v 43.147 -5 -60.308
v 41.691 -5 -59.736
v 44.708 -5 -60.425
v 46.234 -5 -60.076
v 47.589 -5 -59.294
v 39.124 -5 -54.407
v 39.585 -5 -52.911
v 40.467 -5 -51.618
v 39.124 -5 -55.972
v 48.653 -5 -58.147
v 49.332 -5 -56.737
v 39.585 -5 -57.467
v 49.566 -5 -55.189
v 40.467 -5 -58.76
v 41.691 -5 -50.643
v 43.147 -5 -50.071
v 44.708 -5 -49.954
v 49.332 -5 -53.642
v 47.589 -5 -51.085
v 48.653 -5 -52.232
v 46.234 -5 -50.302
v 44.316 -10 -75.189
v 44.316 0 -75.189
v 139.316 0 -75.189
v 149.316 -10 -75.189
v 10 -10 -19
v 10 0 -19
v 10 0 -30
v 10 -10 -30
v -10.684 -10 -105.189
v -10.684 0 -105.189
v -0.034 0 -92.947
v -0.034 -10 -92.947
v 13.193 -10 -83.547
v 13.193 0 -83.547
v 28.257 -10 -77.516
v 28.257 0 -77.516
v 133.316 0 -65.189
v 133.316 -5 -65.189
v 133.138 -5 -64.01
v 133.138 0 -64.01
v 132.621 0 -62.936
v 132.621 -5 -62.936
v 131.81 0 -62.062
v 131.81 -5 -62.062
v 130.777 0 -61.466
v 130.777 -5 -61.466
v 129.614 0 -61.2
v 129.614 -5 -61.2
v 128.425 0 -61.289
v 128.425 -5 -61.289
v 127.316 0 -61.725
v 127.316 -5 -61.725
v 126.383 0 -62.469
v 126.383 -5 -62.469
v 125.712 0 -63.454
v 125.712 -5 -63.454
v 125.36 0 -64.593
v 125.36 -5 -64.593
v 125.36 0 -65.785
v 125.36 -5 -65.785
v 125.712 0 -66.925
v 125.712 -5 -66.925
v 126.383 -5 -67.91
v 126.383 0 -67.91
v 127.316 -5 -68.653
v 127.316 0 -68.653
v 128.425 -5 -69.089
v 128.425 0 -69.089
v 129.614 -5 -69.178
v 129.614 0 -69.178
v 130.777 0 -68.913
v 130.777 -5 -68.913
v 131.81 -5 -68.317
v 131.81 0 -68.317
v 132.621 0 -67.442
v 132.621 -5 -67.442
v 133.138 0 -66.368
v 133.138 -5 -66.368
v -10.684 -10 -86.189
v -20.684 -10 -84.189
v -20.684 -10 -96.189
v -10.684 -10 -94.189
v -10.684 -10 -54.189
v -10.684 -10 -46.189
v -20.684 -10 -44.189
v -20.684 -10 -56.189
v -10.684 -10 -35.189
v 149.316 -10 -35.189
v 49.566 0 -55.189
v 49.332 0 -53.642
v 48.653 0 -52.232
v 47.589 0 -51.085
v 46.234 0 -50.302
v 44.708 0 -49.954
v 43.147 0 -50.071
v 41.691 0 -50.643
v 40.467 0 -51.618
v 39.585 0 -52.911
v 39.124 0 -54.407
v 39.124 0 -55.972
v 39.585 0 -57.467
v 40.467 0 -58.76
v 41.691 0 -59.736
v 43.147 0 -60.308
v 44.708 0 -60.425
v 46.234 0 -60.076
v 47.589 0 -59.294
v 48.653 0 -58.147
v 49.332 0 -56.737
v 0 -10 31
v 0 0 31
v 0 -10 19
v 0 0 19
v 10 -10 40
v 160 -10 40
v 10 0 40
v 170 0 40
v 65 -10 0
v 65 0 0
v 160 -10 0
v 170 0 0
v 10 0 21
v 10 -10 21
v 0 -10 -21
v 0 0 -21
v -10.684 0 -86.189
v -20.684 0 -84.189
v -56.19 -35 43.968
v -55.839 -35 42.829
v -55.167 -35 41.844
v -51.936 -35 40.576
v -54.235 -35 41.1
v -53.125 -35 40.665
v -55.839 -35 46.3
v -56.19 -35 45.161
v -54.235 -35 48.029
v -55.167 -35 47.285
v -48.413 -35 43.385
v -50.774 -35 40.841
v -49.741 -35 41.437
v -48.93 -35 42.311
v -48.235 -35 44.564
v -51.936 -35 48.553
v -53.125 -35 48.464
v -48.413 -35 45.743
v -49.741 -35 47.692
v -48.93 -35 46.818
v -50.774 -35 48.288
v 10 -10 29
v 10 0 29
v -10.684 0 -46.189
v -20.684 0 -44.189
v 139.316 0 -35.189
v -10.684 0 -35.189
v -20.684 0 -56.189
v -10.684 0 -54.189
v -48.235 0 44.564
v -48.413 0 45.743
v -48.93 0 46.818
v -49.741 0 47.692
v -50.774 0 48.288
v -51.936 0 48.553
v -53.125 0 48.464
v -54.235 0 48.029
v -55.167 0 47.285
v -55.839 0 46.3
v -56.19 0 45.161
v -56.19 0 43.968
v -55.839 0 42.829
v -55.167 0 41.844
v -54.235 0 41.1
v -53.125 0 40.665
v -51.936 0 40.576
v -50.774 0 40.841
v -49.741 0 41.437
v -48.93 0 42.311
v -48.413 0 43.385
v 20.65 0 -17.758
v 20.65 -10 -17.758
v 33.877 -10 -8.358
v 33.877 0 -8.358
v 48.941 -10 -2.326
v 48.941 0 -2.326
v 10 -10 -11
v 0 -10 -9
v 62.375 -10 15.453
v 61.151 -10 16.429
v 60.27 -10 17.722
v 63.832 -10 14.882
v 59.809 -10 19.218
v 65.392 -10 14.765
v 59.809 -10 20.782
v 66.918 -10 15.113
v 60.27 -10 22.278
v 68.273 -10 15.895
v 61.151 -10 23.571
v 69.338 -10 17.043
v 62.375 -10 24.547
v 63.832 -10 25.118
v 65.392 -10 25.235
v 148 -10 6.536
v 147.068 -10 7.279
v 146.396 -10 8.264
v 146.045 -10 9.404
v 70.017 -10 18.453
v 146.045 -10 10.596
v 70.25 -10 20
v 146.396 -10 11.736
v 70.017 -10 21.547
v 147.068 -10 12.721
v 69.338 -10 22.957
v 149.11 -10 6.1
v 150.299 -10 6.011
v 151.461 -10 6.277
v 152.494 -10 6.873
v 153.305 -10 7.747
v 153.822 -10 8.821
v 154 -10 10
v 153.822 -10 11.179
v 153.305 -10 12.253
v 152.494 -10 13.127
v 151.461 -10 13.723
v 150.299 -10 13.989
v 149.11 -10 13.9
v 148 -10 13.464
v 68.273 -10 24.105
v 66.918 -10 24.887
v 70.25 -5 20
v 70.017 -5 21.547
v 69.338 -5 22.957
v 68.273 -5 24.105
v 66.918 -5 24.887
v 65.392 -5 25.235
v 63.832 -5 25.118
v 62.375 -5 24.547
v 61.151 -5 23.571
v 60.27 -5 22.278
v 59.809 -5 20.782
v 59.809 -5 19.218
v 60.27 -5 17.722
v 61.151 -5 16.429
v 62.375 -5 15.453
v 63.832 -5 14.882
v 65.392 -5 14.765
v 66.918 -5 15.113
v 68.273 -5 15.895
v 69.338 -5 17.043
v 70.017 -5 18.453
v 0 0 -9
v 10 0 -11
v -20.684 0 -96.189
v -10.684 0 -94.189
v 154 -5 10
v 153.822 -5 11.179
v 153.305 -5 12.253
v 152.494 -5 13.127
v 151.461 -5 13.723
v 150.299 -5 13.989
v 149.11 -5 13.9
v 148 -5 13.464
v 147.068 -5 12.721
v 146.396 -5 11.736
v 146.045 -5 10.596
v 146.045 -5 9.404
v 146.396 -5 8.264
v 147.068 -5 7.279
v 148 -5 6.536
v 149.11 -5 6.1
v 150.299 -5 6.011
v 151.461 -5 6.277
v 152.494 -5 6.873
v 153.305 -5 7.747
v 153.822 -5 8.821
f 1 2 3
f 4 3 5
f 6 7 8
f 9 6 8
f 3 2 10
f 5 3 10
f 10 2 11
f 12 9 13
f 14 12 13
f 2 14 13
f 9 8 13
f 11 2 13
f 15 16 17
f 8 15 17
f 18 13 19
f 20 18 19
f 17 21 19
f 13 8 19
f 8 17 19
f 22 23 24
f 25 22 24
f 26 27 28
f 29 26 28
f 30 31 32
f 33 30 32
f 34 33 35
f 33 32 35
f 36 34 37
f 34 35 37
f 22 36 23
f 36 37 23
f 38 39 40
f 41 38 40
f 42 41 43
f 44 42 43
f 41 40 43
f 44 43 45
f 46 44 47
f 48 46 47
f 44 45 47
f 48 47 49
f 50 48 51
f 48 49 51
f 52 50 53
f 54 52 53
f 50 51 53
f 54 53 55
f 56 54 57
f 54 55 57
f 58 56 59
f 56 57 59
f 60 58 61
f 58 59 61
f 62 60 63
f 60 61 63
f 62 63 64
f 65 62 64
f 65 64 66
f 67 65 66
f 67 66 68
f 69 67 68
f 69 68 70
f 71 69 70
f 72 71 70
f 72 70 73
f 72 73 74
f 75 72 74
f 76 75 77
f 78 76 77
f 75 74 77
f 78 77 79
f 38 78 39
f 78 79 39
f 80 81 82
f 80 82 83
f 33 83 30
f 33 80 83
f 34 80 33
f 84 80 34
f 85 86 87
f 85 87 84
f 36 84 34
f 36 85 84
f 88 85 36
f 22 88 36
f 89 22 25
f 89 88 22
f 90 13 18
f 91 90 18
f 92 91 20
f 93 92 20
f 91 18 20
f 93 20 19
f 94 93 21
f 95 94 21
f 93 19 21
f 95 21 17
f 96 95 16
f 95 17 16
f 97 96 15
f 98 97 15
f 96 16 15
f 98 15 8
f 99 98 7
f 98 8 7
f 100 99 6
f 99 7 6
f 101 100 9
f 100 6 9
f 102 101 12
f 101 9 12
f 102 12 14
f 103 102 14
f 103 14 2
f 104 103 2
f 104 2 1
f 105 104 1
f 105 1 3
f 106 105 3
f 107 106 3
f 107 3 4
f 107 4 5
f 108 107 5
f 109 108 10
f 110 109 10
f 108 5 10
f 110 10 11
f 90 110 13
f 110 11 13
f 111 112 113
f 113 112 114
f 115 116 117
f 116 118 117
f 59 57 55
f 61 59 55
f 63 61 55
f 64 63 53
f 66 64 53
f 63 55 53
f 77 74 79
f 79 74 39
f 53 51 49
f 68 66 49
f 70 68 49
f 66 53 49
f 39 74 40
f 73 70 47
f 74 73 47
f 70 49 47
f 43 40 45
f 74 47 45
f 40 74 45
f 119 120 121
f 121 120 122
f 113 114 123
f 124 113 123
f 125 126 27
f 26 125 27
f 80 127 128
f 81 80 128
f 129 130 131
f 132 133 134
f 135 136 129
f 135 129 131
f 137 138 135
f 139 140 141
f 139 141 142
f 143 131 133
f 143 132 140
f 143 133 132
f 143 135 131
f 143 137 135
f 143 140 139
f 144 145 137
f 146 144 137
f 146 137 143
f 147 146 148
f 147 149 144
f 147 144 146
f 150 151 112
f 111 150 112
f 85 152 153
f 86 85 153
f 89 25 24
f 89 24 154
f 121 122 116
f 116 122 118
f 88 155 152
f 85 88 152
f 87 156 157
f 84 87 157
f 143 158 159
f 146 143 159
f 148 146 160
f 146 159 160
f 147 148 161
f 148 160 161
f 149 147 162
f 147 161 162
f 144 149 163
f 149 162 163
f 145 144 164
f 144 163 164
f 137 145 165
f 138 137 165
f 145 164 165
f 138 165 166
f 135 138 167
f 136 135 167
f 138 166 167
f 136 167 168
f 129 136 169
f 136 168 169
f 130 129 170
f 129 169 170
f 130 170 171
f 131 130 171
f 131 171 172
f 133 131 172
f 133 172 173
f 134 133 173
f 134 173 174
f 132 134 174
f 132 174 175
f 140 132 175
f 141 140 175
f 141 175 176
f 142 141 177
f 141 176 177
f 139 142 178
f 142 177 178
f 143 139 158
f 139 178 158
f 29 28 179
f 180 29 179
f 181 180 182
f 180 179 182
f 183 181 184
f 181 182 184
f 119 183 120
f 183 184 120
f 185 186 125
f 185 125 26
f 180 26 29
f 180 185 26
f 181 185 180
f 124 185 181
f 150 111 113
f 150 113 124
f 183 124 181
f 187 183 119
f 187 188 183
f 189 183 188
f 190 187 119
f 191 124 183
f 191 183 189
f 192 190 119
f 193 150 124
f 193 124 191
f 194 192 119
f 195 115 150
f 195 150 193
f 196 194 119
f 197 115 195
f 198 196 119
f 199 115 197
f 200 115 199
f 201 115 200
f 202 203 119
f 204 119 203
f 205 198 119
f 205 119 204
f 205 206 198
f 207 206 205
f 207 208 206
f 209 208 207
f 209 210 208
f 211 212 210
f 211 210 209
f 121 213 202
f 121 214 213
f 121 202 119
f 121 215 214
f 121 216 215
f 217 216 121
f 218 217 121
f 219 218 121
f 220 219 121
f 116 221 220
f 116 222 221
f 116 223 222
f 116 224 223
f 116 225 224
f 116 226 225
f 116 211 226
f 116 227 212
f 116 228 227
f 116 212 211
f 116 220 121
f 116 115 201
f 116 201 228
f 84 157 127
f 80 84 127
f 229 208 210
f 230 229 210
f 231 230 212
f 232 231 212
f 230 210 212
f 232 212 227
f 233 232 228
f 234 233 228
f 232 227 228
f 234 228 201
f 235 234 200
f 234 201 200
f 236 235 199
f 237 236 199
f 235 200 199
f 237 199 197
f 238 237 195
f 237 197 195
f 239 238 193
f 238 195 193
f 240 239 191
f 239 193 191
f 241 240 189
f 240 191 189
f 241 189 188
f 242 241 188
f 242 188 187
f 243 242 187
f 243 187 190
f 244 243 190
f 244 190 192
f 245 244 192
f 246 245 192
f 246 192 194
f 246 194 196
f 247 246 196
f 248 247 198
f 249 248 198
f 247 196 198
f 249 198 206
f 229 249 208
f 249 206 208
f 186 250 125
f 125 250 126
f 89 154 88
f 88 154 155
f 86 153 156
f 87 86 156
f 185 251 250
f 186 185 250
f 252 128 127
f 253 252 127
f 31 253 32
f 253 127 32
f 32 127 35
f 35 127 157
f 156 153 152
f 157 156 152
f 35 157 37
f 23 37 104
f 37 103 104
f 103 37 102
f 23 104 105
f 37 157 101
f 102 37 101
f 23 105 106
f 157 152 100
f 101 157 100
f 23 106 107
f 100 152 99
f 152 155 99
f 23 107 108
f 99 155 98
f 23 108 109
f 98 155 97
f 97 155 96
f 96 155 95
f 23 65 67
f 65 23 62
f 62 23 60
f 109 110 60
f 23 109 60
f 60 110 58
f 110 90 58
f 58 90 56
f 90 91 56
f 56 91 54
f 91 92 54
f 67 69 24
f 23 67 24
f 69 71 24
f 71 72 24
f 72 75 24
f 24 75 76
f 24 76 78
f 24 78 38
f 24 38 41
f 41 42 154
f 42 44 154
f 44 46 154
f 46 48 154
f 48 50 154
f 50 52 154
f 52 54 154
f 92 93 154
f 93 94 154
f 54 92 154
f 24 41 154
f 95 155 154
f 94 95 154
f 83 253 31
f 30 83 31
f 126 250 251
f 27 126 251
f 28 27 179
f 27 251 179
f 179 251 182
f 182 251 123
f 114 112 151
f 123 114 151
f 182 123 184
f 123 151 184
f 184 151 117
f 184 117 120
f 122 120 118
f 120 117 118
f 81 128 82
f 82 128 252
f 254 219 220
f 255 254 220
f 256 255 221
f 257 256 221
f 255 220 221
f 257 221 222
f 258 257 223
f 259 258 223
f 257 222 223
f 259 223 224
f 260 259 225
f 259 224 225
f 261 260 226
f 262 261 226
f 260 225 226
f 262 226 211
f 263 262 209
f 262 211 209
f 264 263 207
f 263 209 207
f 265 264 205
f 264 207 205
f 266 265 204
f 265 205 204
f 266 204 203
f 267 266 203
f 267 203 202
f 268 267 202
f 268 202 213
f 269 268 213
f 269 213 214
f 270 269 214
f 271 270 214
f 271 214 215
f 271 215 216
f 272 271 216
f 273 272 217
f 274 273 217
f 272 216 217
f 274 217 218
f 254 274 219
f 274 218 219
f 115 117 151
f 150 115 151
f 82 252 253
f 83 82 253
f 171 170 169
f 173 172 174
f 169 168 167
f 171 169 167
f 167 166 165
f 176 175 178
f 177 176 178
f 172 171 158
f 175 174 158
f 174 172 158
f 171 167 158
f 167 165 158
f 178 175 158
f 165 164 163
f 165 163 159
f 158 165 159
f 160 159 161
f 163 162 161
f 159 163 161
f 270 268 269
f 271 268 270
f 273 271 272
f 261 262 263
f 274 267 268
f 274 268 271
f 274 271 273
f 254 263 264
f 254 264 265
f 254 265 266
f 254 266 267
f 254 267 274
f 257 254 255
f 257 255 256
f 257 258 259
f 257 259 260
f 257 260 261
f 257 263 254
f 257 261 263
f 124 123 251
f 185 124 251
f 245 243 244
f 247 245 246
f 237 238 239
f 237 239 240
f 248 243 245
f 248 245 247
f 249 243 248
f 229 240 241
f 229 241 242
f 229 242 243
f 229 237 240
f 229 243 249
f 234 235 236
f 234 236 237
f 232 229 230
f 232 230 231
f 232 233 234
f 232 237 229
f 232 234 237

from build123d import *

# Parameters (mm, degrees)
F1_DEPTH  = 10
F2_R      = 5.25
F2_R_2    = 4
F3_DEPTH  = 5
F4_SIZE   = 9.99999
F6_DEPTH  = 10
F8_START  = -5
F7_R      = 5.25
F7_R_2    = 4
F8_DEPTH  = 5
F9_SIZE   = 9.99999
F10_R     = 4
F11_DEPTH = 35


# Not quite as in the source:
# - a fillet or chamfer is up to 0.001 mm smaller than in the source, because OpenCascade refuses the exact size


with BuildPart() as f1:
    # F0 (on Front) → F1 (new body)
    with BuildSketch(Plane.XZ):
        with BuildLine():
            ThreePointArc((10, -30), (33.8771457744, -8.3581005863), (65, 0))
            Line((65, 0), (170, 0))
            Line((170, 0), (170, 40))
            Line((170, 40), (10, 40))
            Line((10, 40), (10, 29))
            Line((10, 29), (0, 31))
            Line((0, 31), (0, 19))
            Line((0, 19), (10, 21))
            Line((10, 21), (10, -11))
            Line((10, -11), (0, -9))
            Line((0, -9), (0, -21))
            Line((0, -21), (10, -19))
            Line((10, -19), (10, -30))
        make_face()
    extrude(amount=F1_DEPTH)

    # F2 (on face) → F3 (cut)
    with BuildSketch(Plane.XZ.offset(10)):
        with Locations((65, 20)):
            Circle(F2_R)
        with Locations((150, 10)):
            Circle(F2_R_2)
    extrude(amount=-F3_DEPTH, mode=Mode.SUBTRACT)

    # F4 (size 10 in the source; OpenCascade refuses exactly that, so slightly less here)
    f4_edges = [f1.edges().sort_by_distance(p)[0] for p in [
        (170, -10, 20),
    ]]
    chamfer(f4_edges, length=F4_SIZE)


with BuildPart() as f6:
    # F5 (on Front) → F6 (new body)
    with BuildSketch(Plane.XZ):
        with BuildLine():
            ThreePointArc((-10.6844227825, -105.189197356), (13.1927229919, -83.5472979423), (44.3155772175, -75.189197356))
            Line((44.3155772175, -75.189197356), (149.3155772175, -75.189197356))
            Line((149.3155772175, -75.189197356), (149.3155772175, -35.189197356))
            Line((149.3155772175, -35.189197356), (-10.6844227825, -35.189197356))
            Line((-10.6844227825, -35.189197356), (-10.6844227825, -46.189197356))
            Line((-10.6844227825, -46.189197356), (-20.6844227825, -44.189197356))
            Line((-20.6844227825, -44.189197356), (-20.6844227825, -56.189197356))
            Line((-20.6844227825, -56.189197356), (-10.6844227825, -54.189197356))
            Line((-10.6844227825, -54.189197356), (-10.6844227825, -86.189197356))
            Line((-10.6844227825, -86.189197356), (-20.6844227825, -84.189197356))
            Line((-20.6844227825, -84.189197356), (-20.6844227825, -96.189197356))
            Line((-20.6844227825, -96.189197356), (-10.6844227825, -94.189197356))
            Line((-10.6844227825, -94.189197356), (-10.6844227825, -105.189197356))
        make_face()
    extrude(amount=F6_DEPTH)

    # F7 (on face) → F8 (cut)
    with BuildSketch(Plane.XZ.offset(10).offset(F8_START)):
        with Locations((44.3155772175, -55.189197356)):
            Circle(F7_R)
        with Locations((129.3155772175, -65.189197356)):
            Circle(F7_R_2)
    extrude(amount=-F8_DEPTH, mode=Mode.SUBTRACT)

    # F9 (size 10 in the source; OpenCascade refuses exactly that, so slightly less here)
    f9_edges = [f6.edges().sort_by_distance(p)[0] for p in [
        (149.315577, 0, -55.189197),
    ]]
    chamfer(f9_edges, length=F9_SIZE)


with BuildPart() as f11:
    # F10 (on Front) → F11 (new body)
    with BuildSketch(Plane.XZ):
        with Locations((-52.2351078689, 44.5644445717)):
            Circle(F10_R)
    extrude(amount=F11_DEPTH)


solid = Compound([f1.part, f6.part, f11.part])
